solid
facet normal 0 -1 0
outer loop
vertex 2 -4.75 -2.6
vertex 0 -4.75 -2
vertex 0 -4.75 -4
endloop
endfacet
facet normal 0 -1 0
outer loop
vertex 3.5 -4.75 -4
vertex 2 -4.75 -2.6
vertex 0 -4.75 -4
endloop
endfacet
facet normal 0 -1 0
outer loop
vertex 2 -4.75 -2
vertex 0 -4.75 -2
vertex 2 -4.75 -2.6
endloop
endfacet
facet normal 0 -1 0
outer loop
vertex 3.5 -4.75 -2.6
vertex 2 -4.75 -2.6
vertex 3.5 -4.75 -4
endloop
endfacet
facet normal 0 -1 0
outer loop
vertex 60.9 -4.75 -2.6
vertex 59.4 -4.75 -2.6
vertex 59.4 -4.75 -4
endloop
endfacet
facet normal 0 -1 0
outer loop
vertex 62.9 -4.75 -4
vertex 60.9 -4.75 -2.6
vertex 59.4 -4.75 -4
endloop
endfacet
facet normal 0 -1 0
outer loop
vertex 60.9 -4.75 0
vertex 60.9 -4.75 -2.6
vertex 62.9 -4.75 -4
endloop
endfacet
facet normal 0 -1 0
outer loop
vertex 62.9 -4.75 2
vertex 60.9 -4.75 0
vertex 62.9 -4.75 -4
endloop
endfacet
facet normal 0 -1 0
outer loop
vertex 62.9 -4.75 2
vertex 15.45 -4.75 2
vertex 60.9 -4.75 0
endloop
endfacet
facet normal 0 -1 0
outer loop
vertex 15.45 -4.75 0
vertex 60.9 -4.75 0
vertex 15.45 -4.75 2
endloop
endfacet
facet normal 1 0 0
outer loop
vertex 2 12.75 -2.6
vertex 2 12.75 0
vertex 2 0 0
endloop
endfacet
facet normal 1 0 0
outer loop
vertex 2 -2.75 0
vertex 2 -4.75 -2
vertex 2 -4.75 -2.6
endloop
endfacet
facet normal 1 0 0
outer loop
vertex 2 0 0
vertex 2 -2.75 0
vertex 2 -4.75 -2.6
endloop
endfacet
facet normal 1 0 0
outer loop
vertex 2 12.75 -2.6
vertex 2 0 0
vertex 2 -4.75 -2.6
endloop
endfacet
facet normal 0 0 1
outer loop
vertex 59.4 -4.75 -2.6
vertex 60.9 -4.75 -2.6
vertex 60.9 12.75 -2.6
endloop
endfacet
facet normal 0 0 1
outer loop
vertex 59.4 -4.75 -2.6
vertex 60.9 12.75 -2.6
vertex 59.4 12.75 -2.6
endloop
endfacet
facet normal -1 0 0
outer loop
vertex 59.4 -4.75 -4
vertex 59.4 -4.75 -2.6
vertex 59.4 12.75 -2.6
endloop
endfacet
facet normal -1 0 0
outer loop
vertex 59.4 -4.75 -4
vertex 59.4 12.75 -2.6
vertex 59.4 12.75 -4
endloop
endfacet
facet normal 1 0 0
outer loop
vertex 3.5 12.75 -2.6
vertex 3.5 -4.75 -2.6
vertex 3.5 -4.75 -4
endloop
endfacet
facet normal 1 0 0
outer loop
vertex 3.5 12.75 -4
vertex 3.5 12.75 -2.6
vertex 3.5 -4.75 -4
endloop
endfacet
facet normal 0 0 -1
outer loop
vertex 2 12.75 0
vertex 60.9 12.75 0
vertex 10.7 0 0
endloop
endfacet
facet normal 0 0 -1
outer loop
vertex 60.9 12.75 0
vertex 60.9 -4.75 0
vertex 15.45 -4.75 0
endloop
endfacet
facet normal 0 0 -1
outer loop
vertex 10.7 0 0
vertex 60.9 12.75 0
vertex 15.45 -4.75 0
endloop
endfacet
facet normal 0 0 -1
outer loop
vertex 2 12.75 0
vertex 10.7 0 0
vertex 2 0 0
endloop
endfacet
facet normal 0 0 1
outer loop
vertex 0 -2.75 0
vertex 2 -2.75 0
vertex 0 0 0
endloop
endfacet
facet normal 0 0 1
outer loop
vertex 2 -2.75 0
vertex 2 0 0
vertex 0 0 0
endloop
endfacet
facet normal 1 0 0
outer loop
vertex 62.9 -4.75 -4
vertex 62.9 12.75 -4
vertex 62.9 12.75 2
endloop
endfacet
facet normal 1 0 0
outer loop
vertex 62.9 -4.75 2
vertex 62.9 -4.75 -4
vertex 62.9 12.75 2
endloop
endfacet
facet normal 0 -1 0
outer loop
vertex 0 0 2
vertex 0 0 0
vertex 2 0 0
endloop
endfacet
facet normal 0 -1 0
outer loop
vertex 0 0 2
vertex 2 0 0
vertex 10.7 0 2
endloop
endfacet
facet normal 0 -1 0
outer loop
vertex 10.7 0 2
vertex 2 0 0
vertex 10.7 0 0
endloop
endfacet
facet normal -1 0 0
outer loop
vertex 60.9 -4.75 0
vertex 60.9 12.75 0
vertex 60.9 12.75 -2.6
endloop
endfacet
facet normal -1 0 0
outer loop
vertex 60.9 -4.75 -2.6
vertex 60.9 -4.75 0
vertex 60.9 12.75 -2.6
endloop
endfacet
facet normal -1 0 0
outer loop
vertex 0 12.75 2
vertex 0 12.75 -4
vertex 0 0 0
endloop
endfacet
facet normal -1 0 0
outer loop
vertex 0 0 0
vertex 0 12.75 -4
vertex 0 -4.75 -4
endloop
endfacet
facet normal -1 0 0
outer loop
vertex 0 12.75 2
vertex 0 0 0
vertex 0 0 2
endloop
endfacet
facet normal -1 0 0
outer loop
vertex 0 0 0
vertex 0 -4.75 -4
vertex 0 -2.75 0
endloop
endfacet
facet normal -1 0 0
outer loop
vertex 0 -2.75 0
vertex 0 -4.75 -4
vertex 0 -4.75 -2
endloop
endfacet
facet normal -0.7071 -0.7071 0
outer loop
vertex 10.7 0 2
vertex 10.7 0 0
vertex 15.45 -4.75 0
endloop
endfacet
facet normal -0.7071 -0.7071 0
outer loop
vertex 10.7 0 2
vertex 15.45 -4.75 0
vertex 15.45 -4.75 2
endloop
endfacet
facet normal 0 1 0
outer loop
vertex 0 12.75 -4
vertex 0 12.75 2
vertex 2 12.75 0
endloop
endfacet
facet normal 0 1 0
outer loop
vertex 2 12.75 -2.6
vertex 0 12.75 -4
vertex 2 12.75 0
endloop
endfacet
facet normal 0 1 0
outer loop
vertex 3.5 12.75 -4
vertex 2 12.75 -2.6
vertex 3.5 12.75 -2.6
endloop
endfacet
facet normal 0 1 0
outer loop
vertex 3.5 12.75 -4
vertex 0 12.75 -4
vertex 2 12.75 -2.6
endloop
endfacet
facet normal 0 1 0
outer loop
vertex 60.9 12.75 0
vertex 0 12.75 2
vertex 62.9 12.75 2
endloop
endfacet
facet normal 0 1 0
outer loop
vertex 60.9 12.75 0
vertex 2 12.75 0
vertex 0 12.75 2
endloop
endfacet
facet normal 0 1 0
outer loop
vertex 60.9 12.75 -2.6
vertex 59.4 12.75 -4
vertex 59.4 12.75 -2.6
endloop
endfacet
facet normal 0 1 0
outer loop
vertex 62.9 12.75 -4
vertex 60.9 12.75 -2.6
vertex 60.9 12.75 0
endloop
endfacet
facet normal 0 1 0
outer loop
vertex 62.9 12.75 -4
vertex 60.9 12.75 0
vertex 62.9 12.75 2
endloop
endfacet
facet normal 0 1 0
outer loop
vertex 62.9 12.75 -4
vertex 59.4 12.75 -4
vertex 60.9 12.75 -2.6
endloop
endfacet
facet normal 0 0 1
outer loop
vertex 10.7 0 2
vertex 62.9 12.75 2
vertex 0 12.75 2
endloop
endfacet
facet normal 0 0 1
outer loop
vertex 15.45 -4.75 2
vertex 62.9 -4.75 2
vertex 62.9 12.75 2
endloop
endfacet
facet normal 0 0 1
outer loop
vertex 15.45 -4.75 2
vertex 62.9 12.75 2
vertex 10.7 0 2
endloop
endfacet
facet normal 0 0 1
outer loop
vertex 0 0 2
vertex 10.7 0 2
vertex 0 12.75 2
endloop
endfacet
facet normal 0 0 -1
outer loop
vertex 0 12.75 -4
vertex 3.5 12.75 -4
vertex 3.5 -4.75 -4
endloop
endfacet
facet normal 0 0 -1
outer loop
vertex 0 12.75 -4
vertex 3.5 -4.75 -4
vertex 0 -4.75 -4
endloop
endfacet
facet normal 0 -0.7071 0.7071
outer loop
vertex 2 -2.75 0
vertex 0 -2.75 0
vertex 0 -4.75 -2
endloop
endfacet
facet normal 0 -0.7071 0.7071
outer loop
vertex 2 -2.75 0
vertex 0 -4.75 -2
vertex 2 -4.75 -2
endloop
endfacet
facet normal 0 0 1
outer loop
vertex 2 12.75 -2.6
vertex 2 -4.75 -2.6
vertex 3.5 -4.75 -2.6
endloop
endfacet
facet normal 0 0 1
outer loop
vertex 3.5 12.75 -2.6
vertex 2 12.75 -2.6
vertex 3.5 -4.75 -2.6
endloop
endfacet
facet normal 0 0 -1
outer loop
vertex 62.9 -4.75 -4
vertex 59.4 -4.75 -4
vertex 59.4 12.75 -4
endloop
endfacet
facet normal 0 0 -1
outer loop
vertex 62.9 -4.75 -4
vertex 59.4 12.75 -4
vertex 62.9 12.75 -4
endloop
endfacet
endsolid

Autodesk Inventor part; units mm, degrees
ref_plane "YZ Plane" through (0, 0, 0) normal (1, 0, 0) x (0, 1, 0)
sketch "Эскиз1" plane through (0, 0, 0) normal (0, 0, 1) x (1, 0, 0)
  line L0 (0, 0) -> (62.9, 0)
  line L1 (62.9, 0) -> (62.9, 8)
  line L2 (62.9, 8) -> (0, 8)
  line L3 (0, 8) -> (0, 0)
  dimension "d0" = 62.9
  dimension "d1" = 8
extrude "Выдавливание1" add sketch "Эскиз1" along normal blind 2
sketch "Эскиз2" plane through (0, 8, 0) normal (0, 1, 0) x (1, 0, 0)
  line L0 (0, 0) -> (2, 0)
  line L1 (2, 0) -> (2, 4)
  line L2 (2, 4) -> (0, 4)
  line L3 (0, 4) -> (0, 0)
  line L4 (2, 4) -> (3.5, 4)
  line L5 (3.5, 4) -> (3.5, 2.6)
  line L6 (3.5, 2.6) -> (2, 2.6)
  line L7 (2, 2.6) -> (2, 4)
  point P0 (2, 2.6)
  point P1 (2, 2.6)
  dimension "d4" = 2
  dimension "d5" = 4
  dimension "d6" = 1.5
  dimension "d7" = 1.4
extrude "Выдавливание2" add sketch "Эскиз2" against normal up to surface (8 mm away)
ref_plane "РабПлоскость1" through (31.45, 0, 2) normal (-1, 0, 0) x (0, 0, 1)
mirror "Зеркальное отражение1" about plane through (31.45, 0, 2) normal (-1, 0, 0) of "Выдавливание2"
sketch "Эскиз6" plane through (0, 0, 2) normal (0, -1, 0) x (1, 0, 0)
  line L0 (62.9, -2) -> (10.7, -2)
  line L1 (10.7, -2) -> (10.7, 0)
  line L2 (10.7, 0) -> (62.9, 0)
  line L3 (62.9, 0) -> (62.9, -2)
  line L4 (2, -2) -> (60.9, -2) projected
  line L5 (0, 0) -> (62.9, 0) projected
  line L6 (2, -2) -> (60.9, -2) projected
  line L7 (60.9, -2) -> (60.9, -4.6) projected
  line L8 (60.9, -4.6) -> (59.4, -4.6) projected
  line L9 (59.4, -4.6) -> (59.4, -6) projected
  line L10 (59.4, -6) -> (62.9, -6) projected
  line L11 (62.9, -6) -> (62.9, 0) projected
  line L12 (0, 0) -> (62.9, 0) projected
  line L13 (0, -6) -> (0, 0) projected
  line L14 (3.5, -6) -> (0, -6) projected
  line L15 (3.5, -4.6) -> (3.5, -6) projected
  line L16 (2, -4.6) -> (3.5, -4.6) projected
  line L17 (2, -2) -> (2, -4.6) projected
  line L18 (60.9, -2) -> (62.9, -2)
  line L19 (2, -2) -> (0, -2)
  line L20 (62.9, -6) -> (62.9, 0) projected
  point P0 (0, -2)
  dimension "d29" = 10.7
extrude "Выдавливание6" add sketch "Эскиз6" along normal blind 4.75 contours L11 L10 L9 L8 L7 L0 | L0 L1 L2 L3 | L17 L16 L15 L14 L13 L19
ref_plane "РабПлоскость2" through (0, 4, 2) normal (0, 1, 0) x (1, 0, 0)
sketch "Эскиз7" plane through (0, 8, 2) normal (0, 1, 0) x (1, 0, 0)
  line L0 (60.9, 2) -> (2, 2) projected
  line L1 (2, 2) -> (2, 4.6) projected
  line L2 (2, 4.6) -> (3.5, 4.6) projected
  line L3 (3.5, 4.6) -> (3.5, 6) projected
  line L4 (3.5, 6) -> (0, 6) projected
  line L5 (0, 6) -> (0, 0) projected
  line L6 (62.9, 0) -> (0, 0) projected
  line L7 (62.9, 6) -> (62.9, 0) projected
  line L8 (59.4, 6) -> (62.9, 6) projected
  line L9 (59.4, 4.6) -> (59.4, 6) projected
  line L10 (60.9, 4.6) -> (59.4, 4.6) projected
  line L11 (60.9, 2) -> (60.9, 4.6) projected
  point P0 (0, 2)
extrude "Выдавливание7" add sketch "Эскиз7" along normal blind 4.75
sketch "Эскиз5" plane through (0, 0, 2) normal (0, 0, 1) x (1, 0, 0)
  line L0 (49.7, 12.75) -> (47.2, 12.75)
  line L1 (47.2, 12.75) -> (47.2, 4.75)
  line L2 (47.2, 4.75) -> (49.7, 4.75)
  line L3 (49.7, 4.75) -> (49.7, 12.75)
  line L4 (62.9, 0) -> (62.9, 8) projected
  line L5 (62.9, 4) -> (49.7, 4)
  line L6 (0, 12.75) -> (62.9, 12.75) projected
  point P0 (0, 0)
  dimension "d15" = 2.5
  dimension "d16" = 8
  dimension "d19" = 13.2
extrude "Выдавливание5" [suppressed]
chamfer "Фаска1" distance 4.75 angle 45 1 edges at (10.7, -4.75, 1)
chamfer "Фаска2" distance 2 angle 45 1 edges at (1, -4.75, 0)
properties part number "Крышка аккумулятора"
